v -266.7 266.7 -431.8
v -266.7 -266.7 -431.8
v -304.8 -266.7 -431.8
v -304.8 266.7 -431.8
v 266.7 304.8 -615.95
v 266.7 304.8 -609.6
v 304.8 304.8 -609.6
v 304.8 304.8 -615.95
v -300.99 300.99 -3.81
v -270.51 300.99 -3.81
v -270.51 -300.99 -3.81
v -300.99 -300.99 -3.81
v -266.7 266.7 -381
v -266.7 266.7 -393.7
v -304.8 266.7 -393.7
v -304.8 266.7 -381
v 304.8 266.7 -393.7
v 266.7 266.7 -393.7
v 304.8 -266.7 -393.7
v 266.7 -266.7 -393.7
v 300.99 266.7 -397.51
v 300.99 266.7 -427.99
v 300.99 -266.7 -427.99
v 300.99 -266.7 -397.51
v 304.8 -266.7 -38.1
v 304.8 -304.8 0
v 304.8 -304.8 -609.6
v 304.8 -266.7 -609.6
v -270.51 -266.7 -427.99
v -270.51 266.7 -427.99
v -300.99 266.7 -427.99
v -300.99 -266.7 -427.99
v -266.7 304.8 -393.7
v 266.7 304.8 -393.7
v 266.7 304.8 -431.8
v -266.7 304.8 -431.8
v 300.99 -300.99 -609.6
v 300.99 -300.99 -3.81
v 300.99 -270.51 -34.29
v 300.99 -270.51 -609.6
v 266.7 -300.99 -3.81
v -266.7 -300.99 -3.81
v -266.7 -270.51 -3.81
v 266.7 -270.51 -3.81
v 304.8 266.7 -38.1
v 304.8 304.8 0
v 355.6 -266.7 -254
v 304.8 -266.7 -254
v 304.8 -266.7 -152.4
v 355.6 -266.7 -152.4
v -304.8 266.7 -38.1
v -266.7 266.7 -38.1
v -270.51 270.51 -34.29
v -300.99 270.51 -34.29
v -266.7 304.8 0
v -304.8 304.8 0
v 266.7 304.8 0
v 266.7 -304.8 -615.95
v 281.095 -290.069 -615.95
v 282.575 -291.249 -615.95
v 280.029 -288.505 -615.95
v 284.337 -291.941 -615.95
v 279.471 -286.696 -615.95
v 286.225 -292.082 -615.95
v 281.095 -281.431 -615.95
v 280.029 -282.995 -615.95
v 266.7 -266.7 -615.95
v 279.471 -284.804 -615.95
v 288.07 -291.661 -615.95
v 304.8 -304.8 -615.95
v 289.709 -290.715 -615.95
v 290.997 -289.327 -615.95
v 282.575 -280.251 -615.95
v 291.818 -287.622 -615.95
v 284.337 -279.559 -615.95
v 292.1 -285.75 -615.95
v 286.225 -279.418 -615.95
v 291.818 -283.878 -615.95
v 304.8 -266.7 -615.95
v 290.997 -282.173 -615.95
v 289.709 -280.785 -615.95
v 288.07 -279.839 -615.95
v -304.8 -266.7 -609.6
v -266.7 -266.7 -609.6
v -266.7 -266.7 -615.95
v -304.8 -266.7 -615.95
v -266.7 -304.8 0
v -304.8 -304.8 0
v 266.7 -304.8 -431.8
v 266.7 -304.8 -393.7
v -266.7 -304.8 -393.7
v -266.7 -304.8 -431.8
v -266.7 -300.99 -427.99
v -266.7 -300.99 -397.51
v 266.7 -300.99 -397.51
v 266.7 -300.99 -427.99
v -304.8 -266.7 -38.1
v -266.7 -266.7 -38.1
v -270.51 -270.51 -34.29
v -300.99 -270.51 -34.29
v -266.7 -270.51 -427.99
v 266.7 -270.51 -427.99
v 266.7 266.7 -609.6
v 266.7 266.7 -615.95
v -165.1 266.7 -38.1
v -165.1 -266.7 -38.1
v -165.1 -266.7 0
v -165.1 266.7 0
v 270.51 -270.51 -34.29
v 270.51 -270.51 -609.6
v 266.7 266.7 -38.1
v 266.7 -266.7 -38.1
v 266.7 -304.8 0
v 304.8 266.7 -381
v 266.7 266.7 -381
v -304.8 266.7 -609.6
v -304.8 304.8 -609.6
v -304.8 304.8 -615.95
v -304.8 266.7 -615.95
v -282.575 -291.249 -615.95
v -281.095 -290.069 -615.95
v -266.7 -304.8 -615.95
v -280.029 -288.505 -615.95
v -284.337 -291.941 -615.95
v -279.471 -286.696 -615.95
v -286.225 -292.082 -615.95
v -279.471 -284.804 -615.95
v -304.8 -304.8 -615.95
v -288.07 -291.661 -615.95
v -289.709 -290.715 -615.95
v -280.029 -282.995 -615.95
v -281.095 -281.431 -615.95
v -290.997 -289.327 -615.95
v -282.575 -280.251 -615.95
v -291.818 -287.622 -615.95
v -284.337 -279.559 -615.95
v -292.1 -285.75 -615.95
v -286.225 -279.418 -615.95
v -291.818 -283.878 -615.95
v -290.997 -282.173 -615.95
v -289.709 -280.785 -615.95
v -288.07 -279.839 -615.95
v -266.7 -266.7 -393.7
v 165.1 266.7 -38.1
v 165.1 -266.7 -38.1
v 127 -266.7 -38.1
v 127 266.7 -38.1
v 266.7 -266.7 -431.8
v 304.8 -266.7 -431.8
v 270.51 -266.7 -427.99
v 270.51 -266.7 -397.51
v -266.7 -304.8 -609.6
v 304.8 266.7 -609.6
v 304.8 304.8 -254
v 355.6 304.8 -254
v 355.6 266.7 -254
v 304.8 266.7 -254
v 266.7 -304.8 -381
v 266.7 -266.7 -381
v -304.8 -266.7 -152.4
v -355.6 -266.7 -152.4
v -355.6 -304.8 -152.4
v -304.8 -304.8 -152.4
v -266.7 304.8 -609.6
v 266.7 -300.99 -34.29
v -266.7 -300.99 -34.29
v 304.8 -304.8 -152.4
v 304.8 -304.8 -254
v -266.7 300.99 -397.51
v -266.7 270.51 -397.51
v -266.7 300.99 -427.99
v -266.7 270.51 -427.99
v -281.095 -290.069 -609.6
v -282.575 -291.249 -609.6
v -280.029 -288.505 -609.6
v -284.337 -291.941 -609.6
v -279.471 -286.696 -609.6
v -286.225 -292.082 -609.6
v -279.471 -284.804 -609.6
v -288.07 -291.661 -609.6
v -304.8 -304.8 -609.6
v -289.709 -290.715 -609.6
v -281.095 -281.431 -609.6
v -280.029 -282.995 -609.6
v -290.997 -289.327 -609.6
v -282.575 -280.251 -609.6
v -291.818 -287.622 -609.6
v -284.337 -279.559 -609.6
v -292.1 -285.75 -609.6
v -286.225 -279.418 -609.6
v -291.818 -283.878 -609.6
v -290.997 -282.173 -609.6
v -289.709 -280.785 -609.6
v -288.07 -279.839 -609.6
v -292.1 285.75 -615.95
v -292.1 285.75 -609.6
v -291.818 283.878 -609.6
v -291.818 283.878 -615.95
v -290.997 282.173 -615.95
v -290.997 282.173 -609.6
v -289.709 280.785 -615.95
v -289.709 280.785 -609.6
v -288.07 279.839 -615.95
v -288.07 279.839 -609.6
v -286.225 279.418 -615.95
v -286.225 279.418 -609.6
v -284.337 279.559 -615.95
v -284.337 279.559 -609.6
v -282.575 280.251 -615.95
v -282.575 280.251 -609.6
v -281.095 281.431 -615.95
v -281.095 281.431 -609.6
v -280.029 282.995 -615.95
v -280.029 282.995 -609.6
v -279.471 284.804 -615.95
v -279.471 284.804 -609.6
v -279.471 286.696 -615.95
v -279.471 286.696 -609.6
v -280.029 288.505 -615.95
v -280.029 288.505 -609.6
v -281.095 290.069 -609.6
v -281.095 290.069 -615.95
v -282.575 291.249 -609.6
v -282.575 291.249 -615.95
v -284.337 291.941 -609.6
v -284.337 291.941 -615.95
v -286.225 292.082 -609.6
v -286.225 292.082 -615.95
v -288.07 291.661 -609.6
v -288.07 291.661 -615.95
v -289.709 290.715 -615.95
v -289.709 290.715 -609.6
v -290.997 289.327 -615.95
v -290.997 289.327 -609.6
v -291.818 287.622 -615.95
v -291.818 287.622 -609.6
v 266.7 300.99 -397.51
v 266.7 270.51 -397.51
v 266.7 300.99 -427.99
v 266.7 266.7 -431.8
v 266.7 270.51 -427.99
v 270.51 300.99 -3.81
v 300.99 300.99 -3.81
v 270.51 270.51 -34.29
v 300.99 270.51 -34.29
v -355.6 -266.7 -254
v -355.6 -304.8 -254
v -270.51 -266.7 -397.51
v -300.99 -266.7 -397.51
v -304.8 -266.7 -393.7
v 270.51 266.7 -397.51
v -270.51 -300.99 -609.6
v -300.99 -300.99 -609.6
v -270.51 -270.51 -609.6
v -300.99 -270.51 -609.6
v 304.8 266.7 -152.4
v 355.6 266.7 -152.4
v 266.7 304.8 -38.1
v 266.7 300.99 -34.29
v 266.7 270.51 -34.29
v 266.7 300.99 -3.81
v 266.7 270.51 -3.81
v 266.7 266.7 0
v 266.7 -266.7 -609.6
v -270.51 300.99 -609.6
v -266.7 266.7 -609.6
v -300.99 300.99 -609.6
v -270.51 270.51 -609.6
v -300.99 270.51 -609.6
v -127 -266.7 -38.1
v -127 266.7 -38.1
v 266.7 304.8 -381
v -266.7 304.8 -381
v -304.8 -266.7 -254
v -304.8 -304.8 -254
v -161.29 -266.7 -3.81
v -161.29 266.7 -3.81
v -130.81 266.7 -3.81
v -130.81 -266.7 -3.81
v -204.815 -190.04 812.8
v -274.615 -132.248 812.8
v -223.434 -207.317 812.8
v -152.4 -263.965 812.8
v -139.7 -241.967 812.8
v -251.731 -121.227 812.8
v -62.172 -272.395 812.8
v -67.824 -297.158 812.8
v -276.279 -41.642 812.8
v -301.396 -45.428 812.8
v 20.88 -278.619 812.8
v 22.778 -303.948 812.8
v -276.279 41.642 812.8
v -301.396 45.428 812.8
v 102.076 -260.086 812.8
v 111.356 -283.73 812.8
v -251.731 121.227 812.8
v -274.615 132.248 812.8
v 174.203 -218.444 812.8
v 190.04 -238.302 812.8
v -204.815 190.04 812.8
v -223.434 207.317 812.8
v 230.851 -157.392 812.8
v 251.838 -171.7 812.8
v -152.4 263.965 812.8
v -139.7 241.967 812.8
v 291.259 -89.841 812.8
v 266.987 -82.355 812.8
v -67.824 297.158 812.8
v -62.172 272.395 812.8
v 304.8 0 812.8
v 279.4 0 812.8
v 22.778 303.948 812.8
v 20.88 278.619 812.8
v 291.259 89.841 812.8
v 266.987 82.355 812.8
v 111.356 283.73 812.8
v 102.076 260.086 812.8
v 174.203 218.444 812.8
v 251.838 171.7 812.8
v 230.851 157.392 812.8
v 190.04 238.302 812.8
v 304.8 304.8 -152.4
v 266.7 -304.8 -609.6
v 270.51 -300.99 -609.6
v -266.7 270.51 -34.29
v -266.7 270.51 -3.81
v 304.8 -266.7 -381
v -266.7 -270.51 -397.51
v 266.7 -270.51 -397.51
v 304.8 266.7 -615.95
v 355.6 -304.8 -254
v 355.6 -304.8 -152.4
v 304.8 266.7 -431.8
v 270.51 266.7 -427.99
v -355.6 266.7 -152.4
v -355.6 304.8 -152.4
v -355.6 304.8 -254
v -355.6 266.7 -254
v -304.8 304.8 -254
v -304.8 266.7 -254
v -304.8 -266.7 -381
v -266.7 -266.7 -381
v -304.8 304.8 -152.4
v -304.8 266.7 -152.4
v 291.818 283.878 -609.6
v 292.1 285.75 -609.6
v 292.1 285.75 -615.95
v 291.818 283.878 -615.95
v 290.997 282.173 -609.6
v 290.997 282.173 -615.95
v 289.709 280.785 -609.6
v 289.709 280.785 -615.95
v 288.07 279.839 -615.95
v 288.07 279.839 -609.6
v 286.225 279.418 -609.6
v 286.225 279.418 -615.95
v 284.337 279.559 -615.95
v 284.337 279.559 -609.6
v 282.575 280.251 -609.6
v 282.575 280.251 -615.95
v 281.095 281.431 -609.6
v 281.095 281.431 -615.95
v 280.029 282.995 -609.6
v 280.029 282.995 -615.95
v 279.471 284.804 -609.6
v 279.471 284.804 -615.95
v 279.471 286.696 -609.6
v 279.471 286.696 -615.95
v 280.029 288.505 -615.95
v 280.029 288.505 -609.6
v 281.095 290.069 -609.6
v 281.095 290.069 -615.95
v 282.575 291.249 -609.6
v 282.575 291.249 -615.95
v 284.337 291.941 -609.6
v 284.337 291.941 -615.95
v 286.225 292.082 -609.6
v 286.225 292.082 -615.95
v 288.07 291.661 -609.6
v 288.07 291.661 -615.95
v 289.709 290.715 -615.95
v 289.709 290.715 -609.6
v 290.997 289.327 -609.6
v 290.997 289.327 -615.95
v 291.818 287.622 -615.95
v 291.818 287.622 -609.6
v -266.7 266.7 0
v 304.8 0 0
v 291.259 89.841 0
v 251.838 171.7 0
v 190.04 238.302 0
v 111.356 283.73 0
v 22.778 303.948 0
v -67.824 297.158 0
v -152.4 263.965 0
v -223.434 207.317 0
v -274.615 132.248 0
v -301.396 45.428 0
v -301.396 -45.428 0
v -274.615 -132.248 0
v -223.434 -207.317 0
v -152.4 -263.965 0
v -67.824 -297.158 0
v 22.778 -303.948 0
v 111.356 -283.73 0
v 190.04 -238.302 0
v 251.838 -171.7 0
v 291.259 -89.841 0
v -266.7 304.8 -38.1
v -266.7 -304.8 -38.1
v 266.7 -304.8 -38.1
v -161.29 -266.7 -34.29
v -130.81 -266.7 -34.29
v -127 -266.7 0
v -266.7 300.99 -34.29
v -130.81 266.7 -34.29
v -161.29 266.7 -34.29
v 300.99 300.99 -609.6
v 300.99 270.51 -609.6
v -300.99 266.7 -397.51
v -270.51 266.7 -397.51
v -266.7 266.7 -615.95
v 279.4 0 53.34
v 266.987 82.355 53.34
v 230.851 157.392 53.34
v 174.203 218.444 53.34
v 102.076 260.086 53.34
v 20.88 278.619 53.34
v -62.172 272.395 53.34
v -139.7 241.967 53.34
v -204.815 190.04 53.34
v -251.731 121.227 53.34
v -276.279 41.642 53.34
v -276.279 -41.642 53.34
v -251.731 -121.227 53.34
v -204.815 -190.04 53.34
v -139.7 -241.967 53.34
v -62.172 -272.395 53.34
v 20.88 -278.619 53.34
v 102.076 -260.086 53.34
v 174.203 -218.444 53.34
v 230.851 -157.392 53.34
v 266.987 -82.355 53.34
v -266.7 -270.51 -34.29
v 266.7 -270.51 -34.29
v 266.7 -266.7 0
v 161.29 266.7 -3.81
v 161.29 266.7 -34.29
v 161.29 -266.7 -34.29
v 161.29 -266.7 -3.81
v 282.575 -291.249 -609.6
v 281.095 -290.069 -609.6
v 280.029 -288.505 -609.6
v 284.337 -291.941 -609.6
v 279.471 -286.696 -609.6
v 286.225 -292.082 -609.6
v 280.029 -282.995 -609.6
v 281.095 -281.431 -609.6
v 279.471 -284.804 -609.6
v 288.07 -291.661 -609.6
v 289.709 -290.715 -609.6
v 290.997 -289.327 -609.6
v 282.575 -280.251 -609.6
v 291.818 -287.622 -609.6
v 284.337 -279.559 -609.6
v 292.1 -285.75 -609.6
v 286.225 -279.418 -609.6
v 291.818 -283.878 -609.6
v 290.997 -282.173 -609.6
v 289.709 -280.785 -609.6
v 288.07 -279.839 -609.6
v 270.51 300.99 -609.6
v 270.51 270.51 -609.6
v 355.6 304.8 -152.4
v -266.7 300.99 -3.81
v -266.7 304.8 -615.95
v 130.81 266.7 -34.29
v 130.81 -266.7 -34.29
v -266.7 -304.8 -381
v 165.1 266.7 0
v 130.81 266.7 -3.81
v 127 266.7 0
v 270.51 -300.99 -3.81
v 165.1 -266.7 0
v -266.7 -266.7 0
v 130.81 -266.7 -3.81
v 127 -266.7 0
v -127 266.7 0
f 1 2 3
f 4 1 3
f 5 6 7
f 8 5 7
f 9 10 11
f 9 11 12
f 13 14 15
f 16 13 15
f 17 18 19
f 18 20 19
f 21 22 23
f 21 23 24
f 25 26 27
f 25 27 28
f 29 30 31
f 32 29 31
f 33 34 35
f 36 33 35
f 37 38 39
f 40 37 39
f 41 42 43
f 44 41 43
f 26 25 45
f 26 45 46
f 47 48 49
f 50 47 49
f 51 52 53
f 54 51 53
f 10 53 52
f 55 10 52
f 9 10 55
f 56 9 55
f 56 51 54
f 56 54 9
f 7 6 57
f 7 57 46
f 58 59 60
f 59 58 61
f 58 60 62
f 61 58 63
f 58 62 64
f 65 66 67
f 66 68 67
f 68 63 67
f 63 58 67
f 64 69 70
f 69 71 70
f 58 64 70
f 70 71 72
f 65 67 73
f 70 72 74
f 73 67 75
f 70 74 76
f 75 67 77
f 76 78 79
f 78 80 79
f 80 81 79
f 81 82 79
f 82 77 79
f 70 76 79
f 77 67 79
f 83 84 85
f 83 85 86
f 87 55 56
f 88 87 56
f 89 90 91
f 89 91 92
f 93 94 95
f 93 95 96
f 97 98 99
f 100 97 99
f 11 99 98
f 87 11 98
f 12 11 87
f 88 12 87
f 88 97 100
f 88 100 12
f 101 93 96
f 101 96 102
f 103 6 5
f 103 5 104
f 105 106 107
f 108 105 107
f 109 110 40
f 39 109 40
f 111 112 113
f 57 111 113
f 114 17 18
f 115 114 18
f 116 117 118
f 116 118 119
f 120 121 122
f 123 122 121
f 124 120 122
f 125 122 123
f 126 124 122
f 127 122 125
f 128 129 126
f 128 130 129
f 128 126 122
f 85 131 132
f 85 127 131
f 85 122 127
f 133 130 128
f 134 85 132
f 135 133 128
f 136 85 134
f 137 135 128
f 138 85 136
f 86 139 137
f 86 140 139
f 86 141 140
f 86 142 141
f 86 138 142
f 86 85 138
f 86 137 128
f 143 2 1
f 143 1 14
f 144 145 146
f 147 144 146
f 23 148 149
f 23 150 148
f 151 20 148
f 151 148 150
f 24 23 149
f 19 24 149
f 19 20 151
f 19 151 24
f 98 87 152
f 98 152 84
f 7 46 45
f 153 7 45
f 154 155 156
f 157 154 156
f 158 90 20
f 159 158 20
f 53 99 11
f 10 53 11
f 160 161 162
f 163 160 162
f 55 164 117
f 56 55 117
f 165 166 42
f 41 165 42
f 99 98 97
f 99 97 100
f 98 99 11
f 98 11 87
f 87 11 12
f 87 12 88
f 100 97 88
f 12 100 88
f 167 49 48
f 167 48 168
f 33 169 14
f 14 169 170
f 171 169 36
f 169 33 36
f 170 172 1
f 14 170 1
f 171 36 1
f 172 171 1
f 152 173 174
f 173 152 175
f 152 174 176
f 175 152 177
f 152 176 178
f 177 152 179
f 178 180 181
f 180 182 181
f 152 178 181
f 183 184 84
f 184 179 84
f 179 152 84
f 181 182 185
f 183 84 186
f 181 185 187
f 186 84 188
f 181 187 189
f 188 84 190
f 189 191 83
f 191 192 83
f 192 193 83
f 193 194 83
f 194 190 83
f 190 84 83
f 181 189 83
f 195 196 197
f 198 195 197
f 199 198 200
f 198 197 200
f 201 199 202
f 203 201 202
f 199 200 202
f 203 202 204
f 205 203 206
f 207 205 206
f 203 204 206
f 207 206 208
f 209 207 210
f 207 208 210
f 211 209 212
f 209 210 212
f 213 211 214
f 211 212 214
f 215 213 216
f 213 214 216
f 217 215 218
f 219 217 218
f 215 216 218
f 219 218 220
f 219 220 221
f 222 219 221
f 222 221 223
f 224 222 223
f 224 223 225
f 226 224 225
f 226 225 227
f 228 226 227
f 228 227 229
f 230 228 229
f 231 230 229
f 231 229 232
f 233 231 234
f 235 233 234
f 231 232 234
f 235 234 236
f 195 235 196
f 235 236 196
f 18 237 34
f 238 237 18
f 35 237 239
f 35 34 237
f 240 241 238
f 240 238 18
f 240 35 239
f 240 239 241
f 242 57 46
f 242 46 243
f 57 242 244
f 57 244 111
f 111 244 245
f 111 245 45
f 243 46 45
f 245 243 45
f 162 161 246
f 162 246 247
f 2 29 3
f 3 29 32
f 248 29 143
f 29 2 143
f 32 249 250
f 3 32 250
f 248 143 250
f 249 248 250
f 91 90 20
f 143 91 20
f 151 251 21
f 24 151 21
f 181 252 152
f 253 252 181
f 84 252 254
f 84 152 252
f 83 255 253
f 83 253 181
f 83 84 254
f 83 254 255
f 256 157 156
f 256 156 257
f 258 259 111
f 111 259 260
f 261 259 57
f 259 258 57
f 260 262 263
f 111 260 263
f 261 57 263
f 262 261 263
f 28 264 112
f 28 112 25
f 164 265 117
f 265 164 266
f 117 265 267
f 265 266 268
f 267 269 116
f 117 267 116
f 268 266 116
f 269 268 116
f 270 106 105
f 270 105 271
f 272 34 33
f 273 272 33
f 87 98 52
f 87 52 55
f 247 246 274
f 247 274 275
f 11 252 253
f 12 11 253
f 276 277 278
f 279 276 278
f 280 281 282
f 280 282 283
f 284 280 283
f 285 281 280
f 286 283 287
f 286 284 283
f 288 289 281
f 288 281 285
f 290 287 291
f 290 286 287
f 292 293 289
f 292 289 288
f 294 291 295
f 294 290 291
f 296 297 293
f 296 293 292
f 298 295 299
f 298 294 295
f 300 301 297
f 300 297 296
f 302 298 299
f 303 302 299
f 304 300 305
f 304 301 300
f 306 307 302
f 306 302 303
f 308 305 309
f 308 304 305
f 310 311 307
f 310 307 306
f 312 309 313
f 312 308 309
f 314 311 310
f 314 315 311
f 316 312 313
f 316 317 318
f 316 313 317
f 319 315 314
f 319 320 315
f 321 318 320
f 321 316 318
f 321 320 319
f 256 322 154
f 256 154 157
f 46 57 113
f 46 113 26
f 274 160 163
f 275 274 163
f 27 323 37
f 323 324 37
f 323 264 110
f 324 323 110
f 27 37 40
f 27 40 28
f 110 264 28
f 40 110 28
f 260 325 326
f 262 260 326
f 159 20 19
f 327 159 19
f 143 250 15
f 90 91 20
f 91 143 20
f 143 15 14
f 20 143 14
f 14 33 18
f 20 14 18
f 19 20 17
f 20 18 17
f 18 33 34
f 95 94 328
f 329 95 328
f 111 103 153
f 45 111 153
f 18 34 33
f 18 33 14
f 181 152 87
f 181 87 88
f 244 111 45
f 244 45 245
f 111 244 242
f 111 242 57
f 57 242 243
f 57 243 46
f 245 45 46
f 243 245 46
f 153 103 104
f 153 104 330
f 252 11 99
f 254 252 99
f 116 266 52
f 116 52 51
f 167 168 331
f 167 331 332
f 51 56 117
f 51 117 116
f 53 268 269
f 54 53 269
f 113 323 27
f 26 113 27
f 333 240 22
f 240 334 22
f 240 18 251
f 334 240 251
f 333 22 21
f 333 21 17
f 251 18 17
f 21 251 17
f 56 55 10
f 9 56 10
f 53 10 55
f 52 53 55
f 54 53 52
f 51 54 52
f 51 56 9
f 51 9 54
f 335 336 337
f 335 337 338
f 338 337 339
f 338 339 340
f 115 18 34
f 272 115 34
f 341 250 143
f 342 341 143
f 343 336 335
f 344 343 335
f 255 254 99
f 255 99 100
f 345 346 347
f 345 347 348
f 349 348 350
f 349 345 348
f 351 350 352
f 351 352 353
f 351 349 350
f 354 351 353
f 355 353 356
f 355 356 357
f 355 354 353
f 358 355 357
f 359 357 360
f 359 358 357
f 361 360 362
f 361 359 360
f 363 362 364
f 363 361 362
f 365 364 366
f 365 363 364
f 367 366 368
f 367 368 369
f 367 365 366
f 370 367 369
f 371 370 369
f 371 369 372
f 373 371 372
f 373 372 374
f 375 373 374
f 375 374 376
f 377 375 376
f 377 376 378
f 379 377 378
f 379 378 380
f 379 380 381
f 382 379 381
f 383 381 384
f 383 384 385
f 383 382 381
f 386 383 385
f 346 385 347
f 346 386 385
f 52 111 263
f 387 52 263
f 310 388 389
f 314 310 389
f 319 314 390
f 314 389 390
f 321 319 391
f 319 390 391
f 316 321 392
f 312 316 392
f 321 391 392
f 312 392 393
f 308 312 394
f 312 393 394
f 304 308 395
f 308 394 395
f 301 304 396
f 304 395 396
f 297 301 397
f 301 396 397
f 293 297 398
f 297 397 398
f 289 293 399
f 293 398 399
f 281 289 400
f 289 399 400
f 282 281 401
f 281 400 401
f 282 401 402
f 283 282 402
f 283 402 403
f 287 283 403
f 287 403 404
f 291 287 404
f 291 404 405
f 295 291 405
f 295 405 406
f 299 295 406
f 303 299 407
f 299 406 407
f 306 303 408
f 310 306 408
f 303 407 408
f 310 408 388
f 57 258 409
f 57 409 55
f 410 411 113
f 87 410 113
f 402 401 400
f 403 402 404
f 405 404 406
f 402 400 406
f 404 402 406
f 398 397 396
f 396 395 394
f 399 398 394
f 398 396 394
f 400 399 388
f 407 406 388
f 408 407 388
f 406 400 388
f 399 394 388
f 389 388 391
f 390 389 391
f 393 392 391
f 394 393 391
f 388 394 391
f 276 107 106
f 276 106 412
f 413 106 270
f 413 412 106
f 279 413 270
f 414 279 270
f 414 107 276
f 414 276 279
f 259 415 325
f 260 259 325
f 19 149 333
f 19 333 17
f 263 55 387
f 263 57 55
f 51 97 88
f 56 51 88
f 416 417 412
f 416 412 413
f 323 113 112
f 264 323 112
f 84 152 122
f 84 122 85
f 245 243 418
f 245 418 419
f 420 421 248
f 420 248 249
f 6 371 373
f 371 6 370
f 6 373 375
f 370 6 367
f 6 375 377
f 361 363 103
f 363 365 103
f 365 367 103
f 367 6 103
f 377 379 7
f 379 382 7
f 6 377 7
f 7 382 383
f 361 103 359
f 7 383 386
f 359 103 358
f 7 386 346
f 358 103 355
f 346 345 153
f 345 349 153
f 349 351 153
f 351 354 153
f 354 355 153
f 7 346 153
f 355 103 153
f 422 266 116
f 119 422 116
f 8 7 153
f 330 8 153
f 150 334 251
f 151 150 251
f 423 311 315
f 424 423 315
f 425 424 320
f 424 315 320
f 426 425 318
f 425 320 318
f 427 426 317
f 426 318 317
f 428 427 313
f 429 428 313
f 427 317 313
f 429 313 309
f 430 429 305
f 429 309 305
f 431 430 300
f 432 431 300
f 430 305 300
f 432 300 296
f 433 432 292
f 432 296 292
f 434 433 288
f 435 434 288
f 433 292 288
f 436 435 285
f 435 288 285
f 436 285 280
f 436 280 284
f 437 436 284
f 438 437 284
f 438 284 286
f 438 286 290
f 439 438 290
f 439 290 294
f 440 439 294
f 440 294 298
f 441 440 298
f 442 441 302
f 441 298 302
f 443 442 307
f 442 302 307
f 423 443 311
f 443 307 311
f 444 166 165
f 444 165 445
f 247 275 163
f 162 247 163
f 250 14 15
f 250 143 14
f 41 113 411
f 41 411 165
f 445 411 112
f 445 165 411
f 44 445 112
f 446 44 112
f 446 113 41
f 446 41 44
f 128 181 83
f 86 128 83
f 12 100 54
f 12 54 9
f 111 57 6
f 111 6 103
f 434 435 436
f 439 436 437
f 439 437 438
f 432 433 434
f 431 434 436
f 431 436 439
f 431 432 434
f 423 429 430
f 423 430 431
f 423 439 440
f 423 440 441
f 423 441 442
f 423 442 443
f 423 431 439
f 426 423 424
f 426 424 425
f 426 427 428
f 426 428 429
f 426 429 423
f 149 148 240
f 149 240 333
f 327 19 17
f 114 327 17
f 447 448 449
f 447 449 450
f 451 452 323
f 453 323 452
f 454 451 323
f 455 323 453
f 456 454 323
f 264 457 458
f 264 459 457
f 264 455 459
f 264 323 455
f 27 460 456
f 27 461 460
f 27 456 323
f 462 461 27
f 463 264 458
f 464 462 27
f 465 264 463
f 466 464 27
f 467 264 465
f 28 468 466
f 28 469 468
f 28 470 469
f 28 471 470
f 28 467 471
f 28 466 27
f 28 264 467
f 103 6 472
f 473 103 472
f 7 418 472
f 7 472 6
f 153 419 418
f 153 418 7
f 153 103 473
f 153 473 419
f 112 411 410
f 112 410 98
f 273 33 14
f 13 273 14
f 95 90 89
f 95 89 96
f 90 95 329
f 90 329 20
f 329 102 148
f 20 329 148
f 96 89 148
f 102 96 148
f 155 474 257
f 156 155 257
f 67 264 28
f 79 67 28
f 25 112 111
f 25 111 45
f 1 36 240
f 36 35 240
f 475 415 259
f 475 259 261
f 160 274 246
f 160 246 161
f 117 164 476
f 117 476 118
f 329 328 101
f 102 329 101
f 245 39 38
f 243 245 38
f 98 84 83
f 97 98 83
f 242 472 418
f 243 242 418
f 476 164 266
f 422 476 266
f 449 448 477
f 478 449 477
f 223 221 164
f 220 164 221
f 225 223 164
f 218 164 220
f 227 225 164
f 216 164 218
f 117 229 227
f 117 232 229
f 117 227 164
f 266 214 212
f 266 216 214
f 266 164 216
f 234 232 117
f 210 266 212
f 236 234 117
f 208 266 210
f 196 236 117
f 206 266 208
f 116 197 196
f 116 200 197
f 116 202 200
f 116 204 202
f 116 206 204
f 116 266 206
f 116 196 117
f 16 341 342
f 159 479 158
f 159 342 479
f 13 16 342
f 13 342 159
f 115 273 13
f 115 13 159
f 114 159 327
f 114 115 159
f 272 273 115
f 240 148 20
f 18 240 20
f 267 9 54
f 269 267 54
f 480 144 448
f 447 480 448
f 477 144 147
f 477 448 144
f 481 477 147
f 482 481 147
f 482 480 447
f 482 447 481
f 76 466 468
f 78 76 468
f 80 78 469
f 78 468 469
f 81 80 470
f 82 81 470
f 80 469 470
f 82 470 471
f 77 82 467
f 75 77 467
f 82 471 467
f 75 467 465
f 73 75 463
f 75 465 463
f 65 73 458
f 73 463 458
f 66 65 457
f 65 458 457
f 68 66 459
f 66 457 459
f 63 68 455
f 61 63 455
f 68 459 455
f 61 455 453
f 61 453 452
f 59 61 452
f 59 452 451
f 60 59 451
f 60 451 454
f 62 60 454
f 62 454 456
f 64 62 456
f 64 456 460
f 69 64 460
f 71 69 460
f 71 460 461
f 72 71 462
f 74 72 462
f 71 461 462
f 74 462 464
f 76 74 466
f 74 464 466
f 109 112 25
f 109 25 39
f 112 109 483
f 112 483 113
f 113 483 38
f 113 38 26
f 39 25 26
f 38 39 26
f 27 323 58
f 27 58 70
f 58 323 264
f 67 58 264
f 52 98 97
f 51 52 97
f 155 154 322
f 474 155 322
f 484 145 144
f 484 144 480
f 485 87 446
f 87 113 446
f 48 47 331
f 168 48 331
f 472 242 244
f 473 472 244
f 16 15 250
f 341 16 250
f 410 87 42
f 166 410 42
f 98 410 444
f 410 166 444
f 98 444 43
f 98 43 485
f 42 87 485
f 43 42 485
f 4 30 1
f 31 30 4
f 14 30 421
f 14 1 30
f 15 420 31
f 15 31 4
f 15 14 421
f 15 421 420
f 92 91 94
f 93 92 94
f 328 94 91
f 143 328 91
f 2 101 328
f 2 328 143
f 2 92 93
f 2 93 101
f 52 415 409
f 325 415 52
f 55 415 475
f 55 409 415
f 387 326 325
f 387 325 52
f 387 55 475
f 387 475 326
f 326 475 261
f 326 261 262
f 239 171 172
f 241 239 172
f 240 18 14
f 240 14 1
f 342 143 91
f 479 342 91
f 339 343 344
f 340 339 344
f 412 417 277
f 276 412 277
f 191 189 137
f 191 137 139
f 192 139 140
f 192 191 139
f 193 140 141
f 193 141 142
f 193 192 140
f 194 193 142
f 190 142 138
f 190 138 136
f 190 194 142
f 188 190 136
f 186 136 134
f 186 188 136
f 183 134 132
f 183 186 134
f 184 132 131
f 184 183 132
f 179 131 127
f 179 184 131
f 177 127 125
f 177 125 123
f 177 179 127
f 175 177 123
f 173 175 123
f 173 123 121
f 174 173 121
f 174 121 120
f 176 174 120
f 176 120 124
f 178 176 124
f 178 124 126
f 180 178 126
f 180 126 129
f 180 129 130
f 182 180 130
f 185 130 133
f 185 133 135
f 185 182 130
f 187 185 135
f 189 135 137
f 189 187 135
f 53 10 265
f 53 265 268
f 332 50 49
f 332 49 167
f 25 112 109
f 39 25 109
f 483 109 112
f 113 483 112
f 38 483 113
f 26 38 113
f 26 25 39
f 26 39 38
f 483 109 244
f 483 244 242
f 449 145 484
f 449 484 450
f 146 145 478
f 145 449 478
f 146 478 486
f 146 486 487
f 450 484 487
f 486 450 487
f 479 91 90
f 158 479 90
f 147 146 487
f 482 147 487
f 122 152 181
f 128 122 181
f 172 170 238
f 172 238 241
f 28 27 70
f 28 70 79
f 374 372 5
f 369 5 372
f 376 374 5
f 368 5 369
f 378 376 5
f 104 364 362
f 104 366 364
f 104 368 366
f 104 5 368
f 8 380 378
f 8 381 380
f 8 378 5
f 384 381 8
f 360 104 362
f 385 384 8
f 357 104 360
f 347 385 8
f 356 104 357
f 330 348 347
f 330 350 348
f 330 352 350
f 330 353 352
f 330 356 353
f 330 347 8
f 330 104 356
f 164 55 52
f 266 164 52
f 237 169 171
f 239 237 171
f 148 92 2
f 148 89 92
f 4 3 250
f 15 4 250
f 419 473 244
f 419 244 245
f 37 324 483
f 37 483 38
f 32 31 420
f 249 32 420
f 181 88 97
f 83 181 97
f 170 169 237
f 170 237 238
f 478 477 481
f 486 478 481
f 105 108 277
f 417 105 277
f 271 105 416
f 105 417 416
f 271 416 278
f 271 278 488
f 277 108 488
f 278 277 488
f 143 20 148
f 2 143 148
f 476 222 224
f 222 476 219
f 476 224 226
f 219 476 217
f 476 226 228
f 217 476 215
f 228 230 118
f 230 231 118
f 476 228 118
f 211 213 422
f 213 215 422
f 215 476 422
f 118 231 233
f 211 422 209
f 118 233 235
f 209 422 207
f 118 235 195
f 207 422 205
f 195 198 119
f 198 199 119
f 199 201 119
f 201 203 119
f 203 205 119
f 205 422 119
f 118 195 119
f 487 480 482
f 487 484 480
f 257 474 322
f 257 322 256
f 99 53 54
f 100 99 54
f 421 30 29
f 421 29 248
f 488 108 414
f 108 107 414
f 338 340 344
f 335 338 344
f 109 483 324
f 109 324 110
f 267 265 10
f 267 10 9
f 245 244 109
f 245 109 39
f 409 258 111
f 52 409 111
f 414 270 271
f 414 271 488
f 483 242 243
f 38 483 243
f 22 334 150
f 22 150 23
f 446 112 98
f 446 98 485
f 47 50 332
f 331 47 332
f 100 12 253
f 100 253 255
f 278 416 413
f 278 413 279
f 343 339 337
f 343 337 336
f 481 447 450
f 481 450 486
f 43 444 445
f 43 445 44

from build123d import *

# Parameters (mm, degrees)
F0_R           = 304.8
F1_DEPTH       = 812.8
F2_W           = 38.1
F2_H           = 38.1
F2_W_2         = 30.48
F2_H_2         = 30.48
F3_DEPTH       = 304.8
F5_DEPTH       = 38.1
F8_W           = 38.1
F8_H           = 38.1
F8_W_2         = 30.48
F8_H_2         = 30.48
F9_REACH       = 1476.2825367264
F12_W          = 38.1
F12_H          = 38.1
F12_W_2        = 30.48
F12_H_2        = 30.48
F13_DEPTH      = 266.7
F13_DEPTH_BACK = 266.7
F17_W          = 38.1
F17_H          = 38.1
F17_W_2        = 30.48
F17_H_2        = 30.48
F18_DEPTH      = 266.7
F18_DEPTH_BACK = 266.7
F20_W          = 38.1
F20_H          = 38.1
F20_W_2        = 30.48
F20_H_2        = 30.48
F21_DEPTH      = 266.7
F21_DEPTH_BACK = 266.7
F24_DEPTH      = 12.7
F25_W          = 38.1
F25_H          = 38.1
F25_R          = 6.35
F26_DEPTH      = 6.35
F29_R          = 279.4
F30_DEPTH      = 759.46
F31_W          = 38.1
F31_H          = 101.6
F32_DEPTH      = 50.8


with BuildPart() as f1:
    # F0 (on Top) → F1 (new body)
    with BuildSketch(Plane.XY):
        Circle(F0_R)
    extrude(amount=F1_DEPTH)

    # F29 (on face) → F30 (cut)
    with BuildSketch(Plane.XY.offset(812.8)):
        Circle(F29_R)
    extrude(amount=-F30_DEPTH, mode=Mode.SUBTRACT)


with BuildPart() as f3:
    # F2 (on Front) → F3 (new body, symmetric)
    with BuildSketch(Plane.XZ):
        with Locations((285.75, -19.05)):
            Rectangle(F2_W, F2_H)
        with Locations((285.75, -19.05)):
            Rectangle(F2_W_2, F2_H_2, mode=Mode.SUBTRACT)
    extrude(amount=F3_DEPTH, both=True)

    # F4 (on face) → F5 (cut, through all)
    with BuildSketch(Plane.YZ.offset(304.8)):
        Polygon((-266.7, -38.1), (-304.8, 0), (-315.9340023994, 0), (-315.9340023994, -51.912445575), (-266.7, -51.912445575), align=None)
        Polygon((315.9340023994, -51.912445575), (315.9340023994, 0), (304.8, 0), (266.7, -38.1), (266.7, -51.912445575), align=None)
    extrude(amount=-F5_DEPTH, mode=Mode.SUBTRACT)


with BuildPart() as f6_1:
    # F6: instance of F3
    add(f3.part.mirror(Plane.YZ))


with BuildPart() as f9:
    f9_end = f3.part.faces().sort_by_distance((285.75, -267.166627796, -37.633372204))[0]
    # F8 (on offset) → F9 (new body, up to a face of F3 that its end follows)
    with BuildSketch(Plane.XY.offset(-609.6)):
        with Locations((285.75, -285.75)):
            Rectangle(F8_W, F8_H)
        with Locations((285.75, -285.75)):
            Rectangle(F8_W_2, F8_H_2, mode=Mode.SUBTRACT)
    f9_long = extrude(amount=F9_REACH, mode=Mode.PRIVATE)
    add(split(f9_long, bisect_by=f9_end, keep=Keep.TOP, mode=Mode.PRIVATE))


with BuildPart() as f10_1:
    # F10: instance of F9
    add(f9.part.mirror(Plane.XZ))


with BuildPart() as f11_1:
    # F11: instance of F9
    add(f9.part.mirror(Plane.YZ))


with BuildPart() as f11_2:
    # F11: instance of F10_1
    add(f10_1.part.mirror(Plane.YZ))


with BuildPart() as f13:
    # F12 (on Right) → F13 (new body, two sides)
    with BuildSketch(Plane.YZ) as f13_sk:
        with Locations((-285.75, -19.05)):
            Rectangle(F12_W, F12_H)
        with Locations((-285.75, -19.05)):
            Rectangle(F12_W_2, F12_H_2, mode=Mode.SUBTRACT)
    extrude(amount=F13_DEPTH)
    extrude(f13_sk.sketch, amount=-F13_DEPTH_BACK)


with BuildPart() as f14_1:
    # F14: instance of F13
    add(f13.part.mirror(Plane.XZ))


with BuildPart() as f16_1:
    # F16: instance of F13
    add(f13.part.mirror(Plane(origin=(0, -285.75, -215.9), x_dir=(1, 0, 0), z_dir=(0, 0, -1))))


with BuildPart() as f16_2:
    # F16: instance of F14_1
    add(f14_1.part.mirror(Plane(origin=(0, -285.75, -215.9), x_dir=(1, 0, 0), z_dir=(0, 0, -1))))


with BuildPart() as f18:
    # F17 (on Front) → F18 (new body, two sides)
    with BuildSketch(Plane.XZ) as f18_sk:
        with Locations((285.75, -412.75)):
            Rectangle(F17_W, F17_H)
        with Locations((285.75, -412.75)):
            Rectangle(F17_W_2, F17_H_2, mode=Mode.SUBTRACT)
    extrude(amount=F18_DEPTH)
    extrude(f18_sk.sketch, amount=-F18_DEPTH_BACK)


with BuildPart() as f19_1:
    # F19: instance of F18
    add(f18.part.mirror(Plane.YZ))


with BuildPart() as f21:
    # F20 (on Front) → F21 (new body, two sides)
    with BuildSketch(Plane.XZ) as f21_sk:
        with Locations((-146.05, -19.05)):
            Rectangle(F20_W, F20_H)
        with Locations((-146.05, -19.05)):
            Rectangle(F20_W_2, F20_H_2, mode=Mode.SUBTRACT)
    extrude(amount=F21_DEPTH)
    extrude(f21_sk.sketch, amount=-F21_DEPTH_BACK)


with BuildPart() as f22_1:
    # F22: instance of F21
    add(f21.part.mirror(Plane.YZ))


with BuildPart() as f24:
    # F23 (on face) → F24 (new body)
    with BuildSketch(Plane.XY.offset(-393.7)):
        Polygon((-266.6999999998, -304.8), (266.7000000002, -304.8), (266.7, -266.7000000001), (304.8, -266.7000000001), (304.8, 266.7), (266.7, 266.7), (266.7000000002, 304.8), (-266.6999999998, 304.8), (-266.6999999998, 266.7), (-304.8, 266.7), (-304.8, -266.7000000001), (-266.7, -266.7000000001), align=None)
    extrude(amount=F24_DEPTH)


with BuildPart() as f26:
    # F25 (on offset) → F26 (new body)
    with BuildSketch(Plane.XY.offset(-609.6)):
        with Locations((285.75, -285.75)):
            Rectangle(F25_W, F25_H)
        with Locations((285.75, -285.75)):
            Circle(F25_R, mode=Mode.SUBTRACT)
    extrude(amount=-F26_DEPTH)


with BuildPart() as f27_1:
    # F27: instance of F26
    add(f26.part.mirror(Plane.YZ))


with BuildPart() as f28_1:
    # F28: instance of F26
    add(f26.part.mirror(Plane.XZ))


with BuildPart() as f28_2:
    # F28: instance of F27_1
    add(f27_1.part.mirror(Plane.XZ))


with BuildPart() as f32:
    # F31 (on face) → F32 (new body)
    with BuildSketch(Plane(origin=(-304.8, 0, 0), x_dir=(0, -1, 0), z_dir=(-1, 0, 0))):
        with Locations((-285.75, -203.2)):
            Rectangle(F31_W, F31_H)
    extrude(amount=F32_DEPTH)


with BuildPart() as f32b:
    # F31 (on face) → F32, piece 2 (new body)
    with BuildSketch(Plane(origin=(-304.8, 0, 0), x_dir=(0, -1, 0), z_dir=(-1, 0, 0))):
        with Locations((285.75, -203.2)):
            Rectangle(F31_W, F31_H)
    extrude(amount=F32_DEPTH)


with BuildPart() as f33_1:
    # F33: instance of F32b
    add(f32b.part.mirror(Plane.YZ))


with BuildPart() as f33_2:
    # F33: instance of F32
    add(f32.part.mirror(Plane.YZ))


solid = Compound([f1.part, f3.part, f6_1.part, f9.part, f10_1.part, f11_1.part, f11_2.part, f13.part, f14_1.part, f16_1.part, f16_2.part, f18.part, f19_1.part, f21.part, f22_1.part, f24.part, f26.part, f27_1.part, f28_1.part, f28_2.part, f32.part, f32b.part, f33_1.part, f33_2.part])
